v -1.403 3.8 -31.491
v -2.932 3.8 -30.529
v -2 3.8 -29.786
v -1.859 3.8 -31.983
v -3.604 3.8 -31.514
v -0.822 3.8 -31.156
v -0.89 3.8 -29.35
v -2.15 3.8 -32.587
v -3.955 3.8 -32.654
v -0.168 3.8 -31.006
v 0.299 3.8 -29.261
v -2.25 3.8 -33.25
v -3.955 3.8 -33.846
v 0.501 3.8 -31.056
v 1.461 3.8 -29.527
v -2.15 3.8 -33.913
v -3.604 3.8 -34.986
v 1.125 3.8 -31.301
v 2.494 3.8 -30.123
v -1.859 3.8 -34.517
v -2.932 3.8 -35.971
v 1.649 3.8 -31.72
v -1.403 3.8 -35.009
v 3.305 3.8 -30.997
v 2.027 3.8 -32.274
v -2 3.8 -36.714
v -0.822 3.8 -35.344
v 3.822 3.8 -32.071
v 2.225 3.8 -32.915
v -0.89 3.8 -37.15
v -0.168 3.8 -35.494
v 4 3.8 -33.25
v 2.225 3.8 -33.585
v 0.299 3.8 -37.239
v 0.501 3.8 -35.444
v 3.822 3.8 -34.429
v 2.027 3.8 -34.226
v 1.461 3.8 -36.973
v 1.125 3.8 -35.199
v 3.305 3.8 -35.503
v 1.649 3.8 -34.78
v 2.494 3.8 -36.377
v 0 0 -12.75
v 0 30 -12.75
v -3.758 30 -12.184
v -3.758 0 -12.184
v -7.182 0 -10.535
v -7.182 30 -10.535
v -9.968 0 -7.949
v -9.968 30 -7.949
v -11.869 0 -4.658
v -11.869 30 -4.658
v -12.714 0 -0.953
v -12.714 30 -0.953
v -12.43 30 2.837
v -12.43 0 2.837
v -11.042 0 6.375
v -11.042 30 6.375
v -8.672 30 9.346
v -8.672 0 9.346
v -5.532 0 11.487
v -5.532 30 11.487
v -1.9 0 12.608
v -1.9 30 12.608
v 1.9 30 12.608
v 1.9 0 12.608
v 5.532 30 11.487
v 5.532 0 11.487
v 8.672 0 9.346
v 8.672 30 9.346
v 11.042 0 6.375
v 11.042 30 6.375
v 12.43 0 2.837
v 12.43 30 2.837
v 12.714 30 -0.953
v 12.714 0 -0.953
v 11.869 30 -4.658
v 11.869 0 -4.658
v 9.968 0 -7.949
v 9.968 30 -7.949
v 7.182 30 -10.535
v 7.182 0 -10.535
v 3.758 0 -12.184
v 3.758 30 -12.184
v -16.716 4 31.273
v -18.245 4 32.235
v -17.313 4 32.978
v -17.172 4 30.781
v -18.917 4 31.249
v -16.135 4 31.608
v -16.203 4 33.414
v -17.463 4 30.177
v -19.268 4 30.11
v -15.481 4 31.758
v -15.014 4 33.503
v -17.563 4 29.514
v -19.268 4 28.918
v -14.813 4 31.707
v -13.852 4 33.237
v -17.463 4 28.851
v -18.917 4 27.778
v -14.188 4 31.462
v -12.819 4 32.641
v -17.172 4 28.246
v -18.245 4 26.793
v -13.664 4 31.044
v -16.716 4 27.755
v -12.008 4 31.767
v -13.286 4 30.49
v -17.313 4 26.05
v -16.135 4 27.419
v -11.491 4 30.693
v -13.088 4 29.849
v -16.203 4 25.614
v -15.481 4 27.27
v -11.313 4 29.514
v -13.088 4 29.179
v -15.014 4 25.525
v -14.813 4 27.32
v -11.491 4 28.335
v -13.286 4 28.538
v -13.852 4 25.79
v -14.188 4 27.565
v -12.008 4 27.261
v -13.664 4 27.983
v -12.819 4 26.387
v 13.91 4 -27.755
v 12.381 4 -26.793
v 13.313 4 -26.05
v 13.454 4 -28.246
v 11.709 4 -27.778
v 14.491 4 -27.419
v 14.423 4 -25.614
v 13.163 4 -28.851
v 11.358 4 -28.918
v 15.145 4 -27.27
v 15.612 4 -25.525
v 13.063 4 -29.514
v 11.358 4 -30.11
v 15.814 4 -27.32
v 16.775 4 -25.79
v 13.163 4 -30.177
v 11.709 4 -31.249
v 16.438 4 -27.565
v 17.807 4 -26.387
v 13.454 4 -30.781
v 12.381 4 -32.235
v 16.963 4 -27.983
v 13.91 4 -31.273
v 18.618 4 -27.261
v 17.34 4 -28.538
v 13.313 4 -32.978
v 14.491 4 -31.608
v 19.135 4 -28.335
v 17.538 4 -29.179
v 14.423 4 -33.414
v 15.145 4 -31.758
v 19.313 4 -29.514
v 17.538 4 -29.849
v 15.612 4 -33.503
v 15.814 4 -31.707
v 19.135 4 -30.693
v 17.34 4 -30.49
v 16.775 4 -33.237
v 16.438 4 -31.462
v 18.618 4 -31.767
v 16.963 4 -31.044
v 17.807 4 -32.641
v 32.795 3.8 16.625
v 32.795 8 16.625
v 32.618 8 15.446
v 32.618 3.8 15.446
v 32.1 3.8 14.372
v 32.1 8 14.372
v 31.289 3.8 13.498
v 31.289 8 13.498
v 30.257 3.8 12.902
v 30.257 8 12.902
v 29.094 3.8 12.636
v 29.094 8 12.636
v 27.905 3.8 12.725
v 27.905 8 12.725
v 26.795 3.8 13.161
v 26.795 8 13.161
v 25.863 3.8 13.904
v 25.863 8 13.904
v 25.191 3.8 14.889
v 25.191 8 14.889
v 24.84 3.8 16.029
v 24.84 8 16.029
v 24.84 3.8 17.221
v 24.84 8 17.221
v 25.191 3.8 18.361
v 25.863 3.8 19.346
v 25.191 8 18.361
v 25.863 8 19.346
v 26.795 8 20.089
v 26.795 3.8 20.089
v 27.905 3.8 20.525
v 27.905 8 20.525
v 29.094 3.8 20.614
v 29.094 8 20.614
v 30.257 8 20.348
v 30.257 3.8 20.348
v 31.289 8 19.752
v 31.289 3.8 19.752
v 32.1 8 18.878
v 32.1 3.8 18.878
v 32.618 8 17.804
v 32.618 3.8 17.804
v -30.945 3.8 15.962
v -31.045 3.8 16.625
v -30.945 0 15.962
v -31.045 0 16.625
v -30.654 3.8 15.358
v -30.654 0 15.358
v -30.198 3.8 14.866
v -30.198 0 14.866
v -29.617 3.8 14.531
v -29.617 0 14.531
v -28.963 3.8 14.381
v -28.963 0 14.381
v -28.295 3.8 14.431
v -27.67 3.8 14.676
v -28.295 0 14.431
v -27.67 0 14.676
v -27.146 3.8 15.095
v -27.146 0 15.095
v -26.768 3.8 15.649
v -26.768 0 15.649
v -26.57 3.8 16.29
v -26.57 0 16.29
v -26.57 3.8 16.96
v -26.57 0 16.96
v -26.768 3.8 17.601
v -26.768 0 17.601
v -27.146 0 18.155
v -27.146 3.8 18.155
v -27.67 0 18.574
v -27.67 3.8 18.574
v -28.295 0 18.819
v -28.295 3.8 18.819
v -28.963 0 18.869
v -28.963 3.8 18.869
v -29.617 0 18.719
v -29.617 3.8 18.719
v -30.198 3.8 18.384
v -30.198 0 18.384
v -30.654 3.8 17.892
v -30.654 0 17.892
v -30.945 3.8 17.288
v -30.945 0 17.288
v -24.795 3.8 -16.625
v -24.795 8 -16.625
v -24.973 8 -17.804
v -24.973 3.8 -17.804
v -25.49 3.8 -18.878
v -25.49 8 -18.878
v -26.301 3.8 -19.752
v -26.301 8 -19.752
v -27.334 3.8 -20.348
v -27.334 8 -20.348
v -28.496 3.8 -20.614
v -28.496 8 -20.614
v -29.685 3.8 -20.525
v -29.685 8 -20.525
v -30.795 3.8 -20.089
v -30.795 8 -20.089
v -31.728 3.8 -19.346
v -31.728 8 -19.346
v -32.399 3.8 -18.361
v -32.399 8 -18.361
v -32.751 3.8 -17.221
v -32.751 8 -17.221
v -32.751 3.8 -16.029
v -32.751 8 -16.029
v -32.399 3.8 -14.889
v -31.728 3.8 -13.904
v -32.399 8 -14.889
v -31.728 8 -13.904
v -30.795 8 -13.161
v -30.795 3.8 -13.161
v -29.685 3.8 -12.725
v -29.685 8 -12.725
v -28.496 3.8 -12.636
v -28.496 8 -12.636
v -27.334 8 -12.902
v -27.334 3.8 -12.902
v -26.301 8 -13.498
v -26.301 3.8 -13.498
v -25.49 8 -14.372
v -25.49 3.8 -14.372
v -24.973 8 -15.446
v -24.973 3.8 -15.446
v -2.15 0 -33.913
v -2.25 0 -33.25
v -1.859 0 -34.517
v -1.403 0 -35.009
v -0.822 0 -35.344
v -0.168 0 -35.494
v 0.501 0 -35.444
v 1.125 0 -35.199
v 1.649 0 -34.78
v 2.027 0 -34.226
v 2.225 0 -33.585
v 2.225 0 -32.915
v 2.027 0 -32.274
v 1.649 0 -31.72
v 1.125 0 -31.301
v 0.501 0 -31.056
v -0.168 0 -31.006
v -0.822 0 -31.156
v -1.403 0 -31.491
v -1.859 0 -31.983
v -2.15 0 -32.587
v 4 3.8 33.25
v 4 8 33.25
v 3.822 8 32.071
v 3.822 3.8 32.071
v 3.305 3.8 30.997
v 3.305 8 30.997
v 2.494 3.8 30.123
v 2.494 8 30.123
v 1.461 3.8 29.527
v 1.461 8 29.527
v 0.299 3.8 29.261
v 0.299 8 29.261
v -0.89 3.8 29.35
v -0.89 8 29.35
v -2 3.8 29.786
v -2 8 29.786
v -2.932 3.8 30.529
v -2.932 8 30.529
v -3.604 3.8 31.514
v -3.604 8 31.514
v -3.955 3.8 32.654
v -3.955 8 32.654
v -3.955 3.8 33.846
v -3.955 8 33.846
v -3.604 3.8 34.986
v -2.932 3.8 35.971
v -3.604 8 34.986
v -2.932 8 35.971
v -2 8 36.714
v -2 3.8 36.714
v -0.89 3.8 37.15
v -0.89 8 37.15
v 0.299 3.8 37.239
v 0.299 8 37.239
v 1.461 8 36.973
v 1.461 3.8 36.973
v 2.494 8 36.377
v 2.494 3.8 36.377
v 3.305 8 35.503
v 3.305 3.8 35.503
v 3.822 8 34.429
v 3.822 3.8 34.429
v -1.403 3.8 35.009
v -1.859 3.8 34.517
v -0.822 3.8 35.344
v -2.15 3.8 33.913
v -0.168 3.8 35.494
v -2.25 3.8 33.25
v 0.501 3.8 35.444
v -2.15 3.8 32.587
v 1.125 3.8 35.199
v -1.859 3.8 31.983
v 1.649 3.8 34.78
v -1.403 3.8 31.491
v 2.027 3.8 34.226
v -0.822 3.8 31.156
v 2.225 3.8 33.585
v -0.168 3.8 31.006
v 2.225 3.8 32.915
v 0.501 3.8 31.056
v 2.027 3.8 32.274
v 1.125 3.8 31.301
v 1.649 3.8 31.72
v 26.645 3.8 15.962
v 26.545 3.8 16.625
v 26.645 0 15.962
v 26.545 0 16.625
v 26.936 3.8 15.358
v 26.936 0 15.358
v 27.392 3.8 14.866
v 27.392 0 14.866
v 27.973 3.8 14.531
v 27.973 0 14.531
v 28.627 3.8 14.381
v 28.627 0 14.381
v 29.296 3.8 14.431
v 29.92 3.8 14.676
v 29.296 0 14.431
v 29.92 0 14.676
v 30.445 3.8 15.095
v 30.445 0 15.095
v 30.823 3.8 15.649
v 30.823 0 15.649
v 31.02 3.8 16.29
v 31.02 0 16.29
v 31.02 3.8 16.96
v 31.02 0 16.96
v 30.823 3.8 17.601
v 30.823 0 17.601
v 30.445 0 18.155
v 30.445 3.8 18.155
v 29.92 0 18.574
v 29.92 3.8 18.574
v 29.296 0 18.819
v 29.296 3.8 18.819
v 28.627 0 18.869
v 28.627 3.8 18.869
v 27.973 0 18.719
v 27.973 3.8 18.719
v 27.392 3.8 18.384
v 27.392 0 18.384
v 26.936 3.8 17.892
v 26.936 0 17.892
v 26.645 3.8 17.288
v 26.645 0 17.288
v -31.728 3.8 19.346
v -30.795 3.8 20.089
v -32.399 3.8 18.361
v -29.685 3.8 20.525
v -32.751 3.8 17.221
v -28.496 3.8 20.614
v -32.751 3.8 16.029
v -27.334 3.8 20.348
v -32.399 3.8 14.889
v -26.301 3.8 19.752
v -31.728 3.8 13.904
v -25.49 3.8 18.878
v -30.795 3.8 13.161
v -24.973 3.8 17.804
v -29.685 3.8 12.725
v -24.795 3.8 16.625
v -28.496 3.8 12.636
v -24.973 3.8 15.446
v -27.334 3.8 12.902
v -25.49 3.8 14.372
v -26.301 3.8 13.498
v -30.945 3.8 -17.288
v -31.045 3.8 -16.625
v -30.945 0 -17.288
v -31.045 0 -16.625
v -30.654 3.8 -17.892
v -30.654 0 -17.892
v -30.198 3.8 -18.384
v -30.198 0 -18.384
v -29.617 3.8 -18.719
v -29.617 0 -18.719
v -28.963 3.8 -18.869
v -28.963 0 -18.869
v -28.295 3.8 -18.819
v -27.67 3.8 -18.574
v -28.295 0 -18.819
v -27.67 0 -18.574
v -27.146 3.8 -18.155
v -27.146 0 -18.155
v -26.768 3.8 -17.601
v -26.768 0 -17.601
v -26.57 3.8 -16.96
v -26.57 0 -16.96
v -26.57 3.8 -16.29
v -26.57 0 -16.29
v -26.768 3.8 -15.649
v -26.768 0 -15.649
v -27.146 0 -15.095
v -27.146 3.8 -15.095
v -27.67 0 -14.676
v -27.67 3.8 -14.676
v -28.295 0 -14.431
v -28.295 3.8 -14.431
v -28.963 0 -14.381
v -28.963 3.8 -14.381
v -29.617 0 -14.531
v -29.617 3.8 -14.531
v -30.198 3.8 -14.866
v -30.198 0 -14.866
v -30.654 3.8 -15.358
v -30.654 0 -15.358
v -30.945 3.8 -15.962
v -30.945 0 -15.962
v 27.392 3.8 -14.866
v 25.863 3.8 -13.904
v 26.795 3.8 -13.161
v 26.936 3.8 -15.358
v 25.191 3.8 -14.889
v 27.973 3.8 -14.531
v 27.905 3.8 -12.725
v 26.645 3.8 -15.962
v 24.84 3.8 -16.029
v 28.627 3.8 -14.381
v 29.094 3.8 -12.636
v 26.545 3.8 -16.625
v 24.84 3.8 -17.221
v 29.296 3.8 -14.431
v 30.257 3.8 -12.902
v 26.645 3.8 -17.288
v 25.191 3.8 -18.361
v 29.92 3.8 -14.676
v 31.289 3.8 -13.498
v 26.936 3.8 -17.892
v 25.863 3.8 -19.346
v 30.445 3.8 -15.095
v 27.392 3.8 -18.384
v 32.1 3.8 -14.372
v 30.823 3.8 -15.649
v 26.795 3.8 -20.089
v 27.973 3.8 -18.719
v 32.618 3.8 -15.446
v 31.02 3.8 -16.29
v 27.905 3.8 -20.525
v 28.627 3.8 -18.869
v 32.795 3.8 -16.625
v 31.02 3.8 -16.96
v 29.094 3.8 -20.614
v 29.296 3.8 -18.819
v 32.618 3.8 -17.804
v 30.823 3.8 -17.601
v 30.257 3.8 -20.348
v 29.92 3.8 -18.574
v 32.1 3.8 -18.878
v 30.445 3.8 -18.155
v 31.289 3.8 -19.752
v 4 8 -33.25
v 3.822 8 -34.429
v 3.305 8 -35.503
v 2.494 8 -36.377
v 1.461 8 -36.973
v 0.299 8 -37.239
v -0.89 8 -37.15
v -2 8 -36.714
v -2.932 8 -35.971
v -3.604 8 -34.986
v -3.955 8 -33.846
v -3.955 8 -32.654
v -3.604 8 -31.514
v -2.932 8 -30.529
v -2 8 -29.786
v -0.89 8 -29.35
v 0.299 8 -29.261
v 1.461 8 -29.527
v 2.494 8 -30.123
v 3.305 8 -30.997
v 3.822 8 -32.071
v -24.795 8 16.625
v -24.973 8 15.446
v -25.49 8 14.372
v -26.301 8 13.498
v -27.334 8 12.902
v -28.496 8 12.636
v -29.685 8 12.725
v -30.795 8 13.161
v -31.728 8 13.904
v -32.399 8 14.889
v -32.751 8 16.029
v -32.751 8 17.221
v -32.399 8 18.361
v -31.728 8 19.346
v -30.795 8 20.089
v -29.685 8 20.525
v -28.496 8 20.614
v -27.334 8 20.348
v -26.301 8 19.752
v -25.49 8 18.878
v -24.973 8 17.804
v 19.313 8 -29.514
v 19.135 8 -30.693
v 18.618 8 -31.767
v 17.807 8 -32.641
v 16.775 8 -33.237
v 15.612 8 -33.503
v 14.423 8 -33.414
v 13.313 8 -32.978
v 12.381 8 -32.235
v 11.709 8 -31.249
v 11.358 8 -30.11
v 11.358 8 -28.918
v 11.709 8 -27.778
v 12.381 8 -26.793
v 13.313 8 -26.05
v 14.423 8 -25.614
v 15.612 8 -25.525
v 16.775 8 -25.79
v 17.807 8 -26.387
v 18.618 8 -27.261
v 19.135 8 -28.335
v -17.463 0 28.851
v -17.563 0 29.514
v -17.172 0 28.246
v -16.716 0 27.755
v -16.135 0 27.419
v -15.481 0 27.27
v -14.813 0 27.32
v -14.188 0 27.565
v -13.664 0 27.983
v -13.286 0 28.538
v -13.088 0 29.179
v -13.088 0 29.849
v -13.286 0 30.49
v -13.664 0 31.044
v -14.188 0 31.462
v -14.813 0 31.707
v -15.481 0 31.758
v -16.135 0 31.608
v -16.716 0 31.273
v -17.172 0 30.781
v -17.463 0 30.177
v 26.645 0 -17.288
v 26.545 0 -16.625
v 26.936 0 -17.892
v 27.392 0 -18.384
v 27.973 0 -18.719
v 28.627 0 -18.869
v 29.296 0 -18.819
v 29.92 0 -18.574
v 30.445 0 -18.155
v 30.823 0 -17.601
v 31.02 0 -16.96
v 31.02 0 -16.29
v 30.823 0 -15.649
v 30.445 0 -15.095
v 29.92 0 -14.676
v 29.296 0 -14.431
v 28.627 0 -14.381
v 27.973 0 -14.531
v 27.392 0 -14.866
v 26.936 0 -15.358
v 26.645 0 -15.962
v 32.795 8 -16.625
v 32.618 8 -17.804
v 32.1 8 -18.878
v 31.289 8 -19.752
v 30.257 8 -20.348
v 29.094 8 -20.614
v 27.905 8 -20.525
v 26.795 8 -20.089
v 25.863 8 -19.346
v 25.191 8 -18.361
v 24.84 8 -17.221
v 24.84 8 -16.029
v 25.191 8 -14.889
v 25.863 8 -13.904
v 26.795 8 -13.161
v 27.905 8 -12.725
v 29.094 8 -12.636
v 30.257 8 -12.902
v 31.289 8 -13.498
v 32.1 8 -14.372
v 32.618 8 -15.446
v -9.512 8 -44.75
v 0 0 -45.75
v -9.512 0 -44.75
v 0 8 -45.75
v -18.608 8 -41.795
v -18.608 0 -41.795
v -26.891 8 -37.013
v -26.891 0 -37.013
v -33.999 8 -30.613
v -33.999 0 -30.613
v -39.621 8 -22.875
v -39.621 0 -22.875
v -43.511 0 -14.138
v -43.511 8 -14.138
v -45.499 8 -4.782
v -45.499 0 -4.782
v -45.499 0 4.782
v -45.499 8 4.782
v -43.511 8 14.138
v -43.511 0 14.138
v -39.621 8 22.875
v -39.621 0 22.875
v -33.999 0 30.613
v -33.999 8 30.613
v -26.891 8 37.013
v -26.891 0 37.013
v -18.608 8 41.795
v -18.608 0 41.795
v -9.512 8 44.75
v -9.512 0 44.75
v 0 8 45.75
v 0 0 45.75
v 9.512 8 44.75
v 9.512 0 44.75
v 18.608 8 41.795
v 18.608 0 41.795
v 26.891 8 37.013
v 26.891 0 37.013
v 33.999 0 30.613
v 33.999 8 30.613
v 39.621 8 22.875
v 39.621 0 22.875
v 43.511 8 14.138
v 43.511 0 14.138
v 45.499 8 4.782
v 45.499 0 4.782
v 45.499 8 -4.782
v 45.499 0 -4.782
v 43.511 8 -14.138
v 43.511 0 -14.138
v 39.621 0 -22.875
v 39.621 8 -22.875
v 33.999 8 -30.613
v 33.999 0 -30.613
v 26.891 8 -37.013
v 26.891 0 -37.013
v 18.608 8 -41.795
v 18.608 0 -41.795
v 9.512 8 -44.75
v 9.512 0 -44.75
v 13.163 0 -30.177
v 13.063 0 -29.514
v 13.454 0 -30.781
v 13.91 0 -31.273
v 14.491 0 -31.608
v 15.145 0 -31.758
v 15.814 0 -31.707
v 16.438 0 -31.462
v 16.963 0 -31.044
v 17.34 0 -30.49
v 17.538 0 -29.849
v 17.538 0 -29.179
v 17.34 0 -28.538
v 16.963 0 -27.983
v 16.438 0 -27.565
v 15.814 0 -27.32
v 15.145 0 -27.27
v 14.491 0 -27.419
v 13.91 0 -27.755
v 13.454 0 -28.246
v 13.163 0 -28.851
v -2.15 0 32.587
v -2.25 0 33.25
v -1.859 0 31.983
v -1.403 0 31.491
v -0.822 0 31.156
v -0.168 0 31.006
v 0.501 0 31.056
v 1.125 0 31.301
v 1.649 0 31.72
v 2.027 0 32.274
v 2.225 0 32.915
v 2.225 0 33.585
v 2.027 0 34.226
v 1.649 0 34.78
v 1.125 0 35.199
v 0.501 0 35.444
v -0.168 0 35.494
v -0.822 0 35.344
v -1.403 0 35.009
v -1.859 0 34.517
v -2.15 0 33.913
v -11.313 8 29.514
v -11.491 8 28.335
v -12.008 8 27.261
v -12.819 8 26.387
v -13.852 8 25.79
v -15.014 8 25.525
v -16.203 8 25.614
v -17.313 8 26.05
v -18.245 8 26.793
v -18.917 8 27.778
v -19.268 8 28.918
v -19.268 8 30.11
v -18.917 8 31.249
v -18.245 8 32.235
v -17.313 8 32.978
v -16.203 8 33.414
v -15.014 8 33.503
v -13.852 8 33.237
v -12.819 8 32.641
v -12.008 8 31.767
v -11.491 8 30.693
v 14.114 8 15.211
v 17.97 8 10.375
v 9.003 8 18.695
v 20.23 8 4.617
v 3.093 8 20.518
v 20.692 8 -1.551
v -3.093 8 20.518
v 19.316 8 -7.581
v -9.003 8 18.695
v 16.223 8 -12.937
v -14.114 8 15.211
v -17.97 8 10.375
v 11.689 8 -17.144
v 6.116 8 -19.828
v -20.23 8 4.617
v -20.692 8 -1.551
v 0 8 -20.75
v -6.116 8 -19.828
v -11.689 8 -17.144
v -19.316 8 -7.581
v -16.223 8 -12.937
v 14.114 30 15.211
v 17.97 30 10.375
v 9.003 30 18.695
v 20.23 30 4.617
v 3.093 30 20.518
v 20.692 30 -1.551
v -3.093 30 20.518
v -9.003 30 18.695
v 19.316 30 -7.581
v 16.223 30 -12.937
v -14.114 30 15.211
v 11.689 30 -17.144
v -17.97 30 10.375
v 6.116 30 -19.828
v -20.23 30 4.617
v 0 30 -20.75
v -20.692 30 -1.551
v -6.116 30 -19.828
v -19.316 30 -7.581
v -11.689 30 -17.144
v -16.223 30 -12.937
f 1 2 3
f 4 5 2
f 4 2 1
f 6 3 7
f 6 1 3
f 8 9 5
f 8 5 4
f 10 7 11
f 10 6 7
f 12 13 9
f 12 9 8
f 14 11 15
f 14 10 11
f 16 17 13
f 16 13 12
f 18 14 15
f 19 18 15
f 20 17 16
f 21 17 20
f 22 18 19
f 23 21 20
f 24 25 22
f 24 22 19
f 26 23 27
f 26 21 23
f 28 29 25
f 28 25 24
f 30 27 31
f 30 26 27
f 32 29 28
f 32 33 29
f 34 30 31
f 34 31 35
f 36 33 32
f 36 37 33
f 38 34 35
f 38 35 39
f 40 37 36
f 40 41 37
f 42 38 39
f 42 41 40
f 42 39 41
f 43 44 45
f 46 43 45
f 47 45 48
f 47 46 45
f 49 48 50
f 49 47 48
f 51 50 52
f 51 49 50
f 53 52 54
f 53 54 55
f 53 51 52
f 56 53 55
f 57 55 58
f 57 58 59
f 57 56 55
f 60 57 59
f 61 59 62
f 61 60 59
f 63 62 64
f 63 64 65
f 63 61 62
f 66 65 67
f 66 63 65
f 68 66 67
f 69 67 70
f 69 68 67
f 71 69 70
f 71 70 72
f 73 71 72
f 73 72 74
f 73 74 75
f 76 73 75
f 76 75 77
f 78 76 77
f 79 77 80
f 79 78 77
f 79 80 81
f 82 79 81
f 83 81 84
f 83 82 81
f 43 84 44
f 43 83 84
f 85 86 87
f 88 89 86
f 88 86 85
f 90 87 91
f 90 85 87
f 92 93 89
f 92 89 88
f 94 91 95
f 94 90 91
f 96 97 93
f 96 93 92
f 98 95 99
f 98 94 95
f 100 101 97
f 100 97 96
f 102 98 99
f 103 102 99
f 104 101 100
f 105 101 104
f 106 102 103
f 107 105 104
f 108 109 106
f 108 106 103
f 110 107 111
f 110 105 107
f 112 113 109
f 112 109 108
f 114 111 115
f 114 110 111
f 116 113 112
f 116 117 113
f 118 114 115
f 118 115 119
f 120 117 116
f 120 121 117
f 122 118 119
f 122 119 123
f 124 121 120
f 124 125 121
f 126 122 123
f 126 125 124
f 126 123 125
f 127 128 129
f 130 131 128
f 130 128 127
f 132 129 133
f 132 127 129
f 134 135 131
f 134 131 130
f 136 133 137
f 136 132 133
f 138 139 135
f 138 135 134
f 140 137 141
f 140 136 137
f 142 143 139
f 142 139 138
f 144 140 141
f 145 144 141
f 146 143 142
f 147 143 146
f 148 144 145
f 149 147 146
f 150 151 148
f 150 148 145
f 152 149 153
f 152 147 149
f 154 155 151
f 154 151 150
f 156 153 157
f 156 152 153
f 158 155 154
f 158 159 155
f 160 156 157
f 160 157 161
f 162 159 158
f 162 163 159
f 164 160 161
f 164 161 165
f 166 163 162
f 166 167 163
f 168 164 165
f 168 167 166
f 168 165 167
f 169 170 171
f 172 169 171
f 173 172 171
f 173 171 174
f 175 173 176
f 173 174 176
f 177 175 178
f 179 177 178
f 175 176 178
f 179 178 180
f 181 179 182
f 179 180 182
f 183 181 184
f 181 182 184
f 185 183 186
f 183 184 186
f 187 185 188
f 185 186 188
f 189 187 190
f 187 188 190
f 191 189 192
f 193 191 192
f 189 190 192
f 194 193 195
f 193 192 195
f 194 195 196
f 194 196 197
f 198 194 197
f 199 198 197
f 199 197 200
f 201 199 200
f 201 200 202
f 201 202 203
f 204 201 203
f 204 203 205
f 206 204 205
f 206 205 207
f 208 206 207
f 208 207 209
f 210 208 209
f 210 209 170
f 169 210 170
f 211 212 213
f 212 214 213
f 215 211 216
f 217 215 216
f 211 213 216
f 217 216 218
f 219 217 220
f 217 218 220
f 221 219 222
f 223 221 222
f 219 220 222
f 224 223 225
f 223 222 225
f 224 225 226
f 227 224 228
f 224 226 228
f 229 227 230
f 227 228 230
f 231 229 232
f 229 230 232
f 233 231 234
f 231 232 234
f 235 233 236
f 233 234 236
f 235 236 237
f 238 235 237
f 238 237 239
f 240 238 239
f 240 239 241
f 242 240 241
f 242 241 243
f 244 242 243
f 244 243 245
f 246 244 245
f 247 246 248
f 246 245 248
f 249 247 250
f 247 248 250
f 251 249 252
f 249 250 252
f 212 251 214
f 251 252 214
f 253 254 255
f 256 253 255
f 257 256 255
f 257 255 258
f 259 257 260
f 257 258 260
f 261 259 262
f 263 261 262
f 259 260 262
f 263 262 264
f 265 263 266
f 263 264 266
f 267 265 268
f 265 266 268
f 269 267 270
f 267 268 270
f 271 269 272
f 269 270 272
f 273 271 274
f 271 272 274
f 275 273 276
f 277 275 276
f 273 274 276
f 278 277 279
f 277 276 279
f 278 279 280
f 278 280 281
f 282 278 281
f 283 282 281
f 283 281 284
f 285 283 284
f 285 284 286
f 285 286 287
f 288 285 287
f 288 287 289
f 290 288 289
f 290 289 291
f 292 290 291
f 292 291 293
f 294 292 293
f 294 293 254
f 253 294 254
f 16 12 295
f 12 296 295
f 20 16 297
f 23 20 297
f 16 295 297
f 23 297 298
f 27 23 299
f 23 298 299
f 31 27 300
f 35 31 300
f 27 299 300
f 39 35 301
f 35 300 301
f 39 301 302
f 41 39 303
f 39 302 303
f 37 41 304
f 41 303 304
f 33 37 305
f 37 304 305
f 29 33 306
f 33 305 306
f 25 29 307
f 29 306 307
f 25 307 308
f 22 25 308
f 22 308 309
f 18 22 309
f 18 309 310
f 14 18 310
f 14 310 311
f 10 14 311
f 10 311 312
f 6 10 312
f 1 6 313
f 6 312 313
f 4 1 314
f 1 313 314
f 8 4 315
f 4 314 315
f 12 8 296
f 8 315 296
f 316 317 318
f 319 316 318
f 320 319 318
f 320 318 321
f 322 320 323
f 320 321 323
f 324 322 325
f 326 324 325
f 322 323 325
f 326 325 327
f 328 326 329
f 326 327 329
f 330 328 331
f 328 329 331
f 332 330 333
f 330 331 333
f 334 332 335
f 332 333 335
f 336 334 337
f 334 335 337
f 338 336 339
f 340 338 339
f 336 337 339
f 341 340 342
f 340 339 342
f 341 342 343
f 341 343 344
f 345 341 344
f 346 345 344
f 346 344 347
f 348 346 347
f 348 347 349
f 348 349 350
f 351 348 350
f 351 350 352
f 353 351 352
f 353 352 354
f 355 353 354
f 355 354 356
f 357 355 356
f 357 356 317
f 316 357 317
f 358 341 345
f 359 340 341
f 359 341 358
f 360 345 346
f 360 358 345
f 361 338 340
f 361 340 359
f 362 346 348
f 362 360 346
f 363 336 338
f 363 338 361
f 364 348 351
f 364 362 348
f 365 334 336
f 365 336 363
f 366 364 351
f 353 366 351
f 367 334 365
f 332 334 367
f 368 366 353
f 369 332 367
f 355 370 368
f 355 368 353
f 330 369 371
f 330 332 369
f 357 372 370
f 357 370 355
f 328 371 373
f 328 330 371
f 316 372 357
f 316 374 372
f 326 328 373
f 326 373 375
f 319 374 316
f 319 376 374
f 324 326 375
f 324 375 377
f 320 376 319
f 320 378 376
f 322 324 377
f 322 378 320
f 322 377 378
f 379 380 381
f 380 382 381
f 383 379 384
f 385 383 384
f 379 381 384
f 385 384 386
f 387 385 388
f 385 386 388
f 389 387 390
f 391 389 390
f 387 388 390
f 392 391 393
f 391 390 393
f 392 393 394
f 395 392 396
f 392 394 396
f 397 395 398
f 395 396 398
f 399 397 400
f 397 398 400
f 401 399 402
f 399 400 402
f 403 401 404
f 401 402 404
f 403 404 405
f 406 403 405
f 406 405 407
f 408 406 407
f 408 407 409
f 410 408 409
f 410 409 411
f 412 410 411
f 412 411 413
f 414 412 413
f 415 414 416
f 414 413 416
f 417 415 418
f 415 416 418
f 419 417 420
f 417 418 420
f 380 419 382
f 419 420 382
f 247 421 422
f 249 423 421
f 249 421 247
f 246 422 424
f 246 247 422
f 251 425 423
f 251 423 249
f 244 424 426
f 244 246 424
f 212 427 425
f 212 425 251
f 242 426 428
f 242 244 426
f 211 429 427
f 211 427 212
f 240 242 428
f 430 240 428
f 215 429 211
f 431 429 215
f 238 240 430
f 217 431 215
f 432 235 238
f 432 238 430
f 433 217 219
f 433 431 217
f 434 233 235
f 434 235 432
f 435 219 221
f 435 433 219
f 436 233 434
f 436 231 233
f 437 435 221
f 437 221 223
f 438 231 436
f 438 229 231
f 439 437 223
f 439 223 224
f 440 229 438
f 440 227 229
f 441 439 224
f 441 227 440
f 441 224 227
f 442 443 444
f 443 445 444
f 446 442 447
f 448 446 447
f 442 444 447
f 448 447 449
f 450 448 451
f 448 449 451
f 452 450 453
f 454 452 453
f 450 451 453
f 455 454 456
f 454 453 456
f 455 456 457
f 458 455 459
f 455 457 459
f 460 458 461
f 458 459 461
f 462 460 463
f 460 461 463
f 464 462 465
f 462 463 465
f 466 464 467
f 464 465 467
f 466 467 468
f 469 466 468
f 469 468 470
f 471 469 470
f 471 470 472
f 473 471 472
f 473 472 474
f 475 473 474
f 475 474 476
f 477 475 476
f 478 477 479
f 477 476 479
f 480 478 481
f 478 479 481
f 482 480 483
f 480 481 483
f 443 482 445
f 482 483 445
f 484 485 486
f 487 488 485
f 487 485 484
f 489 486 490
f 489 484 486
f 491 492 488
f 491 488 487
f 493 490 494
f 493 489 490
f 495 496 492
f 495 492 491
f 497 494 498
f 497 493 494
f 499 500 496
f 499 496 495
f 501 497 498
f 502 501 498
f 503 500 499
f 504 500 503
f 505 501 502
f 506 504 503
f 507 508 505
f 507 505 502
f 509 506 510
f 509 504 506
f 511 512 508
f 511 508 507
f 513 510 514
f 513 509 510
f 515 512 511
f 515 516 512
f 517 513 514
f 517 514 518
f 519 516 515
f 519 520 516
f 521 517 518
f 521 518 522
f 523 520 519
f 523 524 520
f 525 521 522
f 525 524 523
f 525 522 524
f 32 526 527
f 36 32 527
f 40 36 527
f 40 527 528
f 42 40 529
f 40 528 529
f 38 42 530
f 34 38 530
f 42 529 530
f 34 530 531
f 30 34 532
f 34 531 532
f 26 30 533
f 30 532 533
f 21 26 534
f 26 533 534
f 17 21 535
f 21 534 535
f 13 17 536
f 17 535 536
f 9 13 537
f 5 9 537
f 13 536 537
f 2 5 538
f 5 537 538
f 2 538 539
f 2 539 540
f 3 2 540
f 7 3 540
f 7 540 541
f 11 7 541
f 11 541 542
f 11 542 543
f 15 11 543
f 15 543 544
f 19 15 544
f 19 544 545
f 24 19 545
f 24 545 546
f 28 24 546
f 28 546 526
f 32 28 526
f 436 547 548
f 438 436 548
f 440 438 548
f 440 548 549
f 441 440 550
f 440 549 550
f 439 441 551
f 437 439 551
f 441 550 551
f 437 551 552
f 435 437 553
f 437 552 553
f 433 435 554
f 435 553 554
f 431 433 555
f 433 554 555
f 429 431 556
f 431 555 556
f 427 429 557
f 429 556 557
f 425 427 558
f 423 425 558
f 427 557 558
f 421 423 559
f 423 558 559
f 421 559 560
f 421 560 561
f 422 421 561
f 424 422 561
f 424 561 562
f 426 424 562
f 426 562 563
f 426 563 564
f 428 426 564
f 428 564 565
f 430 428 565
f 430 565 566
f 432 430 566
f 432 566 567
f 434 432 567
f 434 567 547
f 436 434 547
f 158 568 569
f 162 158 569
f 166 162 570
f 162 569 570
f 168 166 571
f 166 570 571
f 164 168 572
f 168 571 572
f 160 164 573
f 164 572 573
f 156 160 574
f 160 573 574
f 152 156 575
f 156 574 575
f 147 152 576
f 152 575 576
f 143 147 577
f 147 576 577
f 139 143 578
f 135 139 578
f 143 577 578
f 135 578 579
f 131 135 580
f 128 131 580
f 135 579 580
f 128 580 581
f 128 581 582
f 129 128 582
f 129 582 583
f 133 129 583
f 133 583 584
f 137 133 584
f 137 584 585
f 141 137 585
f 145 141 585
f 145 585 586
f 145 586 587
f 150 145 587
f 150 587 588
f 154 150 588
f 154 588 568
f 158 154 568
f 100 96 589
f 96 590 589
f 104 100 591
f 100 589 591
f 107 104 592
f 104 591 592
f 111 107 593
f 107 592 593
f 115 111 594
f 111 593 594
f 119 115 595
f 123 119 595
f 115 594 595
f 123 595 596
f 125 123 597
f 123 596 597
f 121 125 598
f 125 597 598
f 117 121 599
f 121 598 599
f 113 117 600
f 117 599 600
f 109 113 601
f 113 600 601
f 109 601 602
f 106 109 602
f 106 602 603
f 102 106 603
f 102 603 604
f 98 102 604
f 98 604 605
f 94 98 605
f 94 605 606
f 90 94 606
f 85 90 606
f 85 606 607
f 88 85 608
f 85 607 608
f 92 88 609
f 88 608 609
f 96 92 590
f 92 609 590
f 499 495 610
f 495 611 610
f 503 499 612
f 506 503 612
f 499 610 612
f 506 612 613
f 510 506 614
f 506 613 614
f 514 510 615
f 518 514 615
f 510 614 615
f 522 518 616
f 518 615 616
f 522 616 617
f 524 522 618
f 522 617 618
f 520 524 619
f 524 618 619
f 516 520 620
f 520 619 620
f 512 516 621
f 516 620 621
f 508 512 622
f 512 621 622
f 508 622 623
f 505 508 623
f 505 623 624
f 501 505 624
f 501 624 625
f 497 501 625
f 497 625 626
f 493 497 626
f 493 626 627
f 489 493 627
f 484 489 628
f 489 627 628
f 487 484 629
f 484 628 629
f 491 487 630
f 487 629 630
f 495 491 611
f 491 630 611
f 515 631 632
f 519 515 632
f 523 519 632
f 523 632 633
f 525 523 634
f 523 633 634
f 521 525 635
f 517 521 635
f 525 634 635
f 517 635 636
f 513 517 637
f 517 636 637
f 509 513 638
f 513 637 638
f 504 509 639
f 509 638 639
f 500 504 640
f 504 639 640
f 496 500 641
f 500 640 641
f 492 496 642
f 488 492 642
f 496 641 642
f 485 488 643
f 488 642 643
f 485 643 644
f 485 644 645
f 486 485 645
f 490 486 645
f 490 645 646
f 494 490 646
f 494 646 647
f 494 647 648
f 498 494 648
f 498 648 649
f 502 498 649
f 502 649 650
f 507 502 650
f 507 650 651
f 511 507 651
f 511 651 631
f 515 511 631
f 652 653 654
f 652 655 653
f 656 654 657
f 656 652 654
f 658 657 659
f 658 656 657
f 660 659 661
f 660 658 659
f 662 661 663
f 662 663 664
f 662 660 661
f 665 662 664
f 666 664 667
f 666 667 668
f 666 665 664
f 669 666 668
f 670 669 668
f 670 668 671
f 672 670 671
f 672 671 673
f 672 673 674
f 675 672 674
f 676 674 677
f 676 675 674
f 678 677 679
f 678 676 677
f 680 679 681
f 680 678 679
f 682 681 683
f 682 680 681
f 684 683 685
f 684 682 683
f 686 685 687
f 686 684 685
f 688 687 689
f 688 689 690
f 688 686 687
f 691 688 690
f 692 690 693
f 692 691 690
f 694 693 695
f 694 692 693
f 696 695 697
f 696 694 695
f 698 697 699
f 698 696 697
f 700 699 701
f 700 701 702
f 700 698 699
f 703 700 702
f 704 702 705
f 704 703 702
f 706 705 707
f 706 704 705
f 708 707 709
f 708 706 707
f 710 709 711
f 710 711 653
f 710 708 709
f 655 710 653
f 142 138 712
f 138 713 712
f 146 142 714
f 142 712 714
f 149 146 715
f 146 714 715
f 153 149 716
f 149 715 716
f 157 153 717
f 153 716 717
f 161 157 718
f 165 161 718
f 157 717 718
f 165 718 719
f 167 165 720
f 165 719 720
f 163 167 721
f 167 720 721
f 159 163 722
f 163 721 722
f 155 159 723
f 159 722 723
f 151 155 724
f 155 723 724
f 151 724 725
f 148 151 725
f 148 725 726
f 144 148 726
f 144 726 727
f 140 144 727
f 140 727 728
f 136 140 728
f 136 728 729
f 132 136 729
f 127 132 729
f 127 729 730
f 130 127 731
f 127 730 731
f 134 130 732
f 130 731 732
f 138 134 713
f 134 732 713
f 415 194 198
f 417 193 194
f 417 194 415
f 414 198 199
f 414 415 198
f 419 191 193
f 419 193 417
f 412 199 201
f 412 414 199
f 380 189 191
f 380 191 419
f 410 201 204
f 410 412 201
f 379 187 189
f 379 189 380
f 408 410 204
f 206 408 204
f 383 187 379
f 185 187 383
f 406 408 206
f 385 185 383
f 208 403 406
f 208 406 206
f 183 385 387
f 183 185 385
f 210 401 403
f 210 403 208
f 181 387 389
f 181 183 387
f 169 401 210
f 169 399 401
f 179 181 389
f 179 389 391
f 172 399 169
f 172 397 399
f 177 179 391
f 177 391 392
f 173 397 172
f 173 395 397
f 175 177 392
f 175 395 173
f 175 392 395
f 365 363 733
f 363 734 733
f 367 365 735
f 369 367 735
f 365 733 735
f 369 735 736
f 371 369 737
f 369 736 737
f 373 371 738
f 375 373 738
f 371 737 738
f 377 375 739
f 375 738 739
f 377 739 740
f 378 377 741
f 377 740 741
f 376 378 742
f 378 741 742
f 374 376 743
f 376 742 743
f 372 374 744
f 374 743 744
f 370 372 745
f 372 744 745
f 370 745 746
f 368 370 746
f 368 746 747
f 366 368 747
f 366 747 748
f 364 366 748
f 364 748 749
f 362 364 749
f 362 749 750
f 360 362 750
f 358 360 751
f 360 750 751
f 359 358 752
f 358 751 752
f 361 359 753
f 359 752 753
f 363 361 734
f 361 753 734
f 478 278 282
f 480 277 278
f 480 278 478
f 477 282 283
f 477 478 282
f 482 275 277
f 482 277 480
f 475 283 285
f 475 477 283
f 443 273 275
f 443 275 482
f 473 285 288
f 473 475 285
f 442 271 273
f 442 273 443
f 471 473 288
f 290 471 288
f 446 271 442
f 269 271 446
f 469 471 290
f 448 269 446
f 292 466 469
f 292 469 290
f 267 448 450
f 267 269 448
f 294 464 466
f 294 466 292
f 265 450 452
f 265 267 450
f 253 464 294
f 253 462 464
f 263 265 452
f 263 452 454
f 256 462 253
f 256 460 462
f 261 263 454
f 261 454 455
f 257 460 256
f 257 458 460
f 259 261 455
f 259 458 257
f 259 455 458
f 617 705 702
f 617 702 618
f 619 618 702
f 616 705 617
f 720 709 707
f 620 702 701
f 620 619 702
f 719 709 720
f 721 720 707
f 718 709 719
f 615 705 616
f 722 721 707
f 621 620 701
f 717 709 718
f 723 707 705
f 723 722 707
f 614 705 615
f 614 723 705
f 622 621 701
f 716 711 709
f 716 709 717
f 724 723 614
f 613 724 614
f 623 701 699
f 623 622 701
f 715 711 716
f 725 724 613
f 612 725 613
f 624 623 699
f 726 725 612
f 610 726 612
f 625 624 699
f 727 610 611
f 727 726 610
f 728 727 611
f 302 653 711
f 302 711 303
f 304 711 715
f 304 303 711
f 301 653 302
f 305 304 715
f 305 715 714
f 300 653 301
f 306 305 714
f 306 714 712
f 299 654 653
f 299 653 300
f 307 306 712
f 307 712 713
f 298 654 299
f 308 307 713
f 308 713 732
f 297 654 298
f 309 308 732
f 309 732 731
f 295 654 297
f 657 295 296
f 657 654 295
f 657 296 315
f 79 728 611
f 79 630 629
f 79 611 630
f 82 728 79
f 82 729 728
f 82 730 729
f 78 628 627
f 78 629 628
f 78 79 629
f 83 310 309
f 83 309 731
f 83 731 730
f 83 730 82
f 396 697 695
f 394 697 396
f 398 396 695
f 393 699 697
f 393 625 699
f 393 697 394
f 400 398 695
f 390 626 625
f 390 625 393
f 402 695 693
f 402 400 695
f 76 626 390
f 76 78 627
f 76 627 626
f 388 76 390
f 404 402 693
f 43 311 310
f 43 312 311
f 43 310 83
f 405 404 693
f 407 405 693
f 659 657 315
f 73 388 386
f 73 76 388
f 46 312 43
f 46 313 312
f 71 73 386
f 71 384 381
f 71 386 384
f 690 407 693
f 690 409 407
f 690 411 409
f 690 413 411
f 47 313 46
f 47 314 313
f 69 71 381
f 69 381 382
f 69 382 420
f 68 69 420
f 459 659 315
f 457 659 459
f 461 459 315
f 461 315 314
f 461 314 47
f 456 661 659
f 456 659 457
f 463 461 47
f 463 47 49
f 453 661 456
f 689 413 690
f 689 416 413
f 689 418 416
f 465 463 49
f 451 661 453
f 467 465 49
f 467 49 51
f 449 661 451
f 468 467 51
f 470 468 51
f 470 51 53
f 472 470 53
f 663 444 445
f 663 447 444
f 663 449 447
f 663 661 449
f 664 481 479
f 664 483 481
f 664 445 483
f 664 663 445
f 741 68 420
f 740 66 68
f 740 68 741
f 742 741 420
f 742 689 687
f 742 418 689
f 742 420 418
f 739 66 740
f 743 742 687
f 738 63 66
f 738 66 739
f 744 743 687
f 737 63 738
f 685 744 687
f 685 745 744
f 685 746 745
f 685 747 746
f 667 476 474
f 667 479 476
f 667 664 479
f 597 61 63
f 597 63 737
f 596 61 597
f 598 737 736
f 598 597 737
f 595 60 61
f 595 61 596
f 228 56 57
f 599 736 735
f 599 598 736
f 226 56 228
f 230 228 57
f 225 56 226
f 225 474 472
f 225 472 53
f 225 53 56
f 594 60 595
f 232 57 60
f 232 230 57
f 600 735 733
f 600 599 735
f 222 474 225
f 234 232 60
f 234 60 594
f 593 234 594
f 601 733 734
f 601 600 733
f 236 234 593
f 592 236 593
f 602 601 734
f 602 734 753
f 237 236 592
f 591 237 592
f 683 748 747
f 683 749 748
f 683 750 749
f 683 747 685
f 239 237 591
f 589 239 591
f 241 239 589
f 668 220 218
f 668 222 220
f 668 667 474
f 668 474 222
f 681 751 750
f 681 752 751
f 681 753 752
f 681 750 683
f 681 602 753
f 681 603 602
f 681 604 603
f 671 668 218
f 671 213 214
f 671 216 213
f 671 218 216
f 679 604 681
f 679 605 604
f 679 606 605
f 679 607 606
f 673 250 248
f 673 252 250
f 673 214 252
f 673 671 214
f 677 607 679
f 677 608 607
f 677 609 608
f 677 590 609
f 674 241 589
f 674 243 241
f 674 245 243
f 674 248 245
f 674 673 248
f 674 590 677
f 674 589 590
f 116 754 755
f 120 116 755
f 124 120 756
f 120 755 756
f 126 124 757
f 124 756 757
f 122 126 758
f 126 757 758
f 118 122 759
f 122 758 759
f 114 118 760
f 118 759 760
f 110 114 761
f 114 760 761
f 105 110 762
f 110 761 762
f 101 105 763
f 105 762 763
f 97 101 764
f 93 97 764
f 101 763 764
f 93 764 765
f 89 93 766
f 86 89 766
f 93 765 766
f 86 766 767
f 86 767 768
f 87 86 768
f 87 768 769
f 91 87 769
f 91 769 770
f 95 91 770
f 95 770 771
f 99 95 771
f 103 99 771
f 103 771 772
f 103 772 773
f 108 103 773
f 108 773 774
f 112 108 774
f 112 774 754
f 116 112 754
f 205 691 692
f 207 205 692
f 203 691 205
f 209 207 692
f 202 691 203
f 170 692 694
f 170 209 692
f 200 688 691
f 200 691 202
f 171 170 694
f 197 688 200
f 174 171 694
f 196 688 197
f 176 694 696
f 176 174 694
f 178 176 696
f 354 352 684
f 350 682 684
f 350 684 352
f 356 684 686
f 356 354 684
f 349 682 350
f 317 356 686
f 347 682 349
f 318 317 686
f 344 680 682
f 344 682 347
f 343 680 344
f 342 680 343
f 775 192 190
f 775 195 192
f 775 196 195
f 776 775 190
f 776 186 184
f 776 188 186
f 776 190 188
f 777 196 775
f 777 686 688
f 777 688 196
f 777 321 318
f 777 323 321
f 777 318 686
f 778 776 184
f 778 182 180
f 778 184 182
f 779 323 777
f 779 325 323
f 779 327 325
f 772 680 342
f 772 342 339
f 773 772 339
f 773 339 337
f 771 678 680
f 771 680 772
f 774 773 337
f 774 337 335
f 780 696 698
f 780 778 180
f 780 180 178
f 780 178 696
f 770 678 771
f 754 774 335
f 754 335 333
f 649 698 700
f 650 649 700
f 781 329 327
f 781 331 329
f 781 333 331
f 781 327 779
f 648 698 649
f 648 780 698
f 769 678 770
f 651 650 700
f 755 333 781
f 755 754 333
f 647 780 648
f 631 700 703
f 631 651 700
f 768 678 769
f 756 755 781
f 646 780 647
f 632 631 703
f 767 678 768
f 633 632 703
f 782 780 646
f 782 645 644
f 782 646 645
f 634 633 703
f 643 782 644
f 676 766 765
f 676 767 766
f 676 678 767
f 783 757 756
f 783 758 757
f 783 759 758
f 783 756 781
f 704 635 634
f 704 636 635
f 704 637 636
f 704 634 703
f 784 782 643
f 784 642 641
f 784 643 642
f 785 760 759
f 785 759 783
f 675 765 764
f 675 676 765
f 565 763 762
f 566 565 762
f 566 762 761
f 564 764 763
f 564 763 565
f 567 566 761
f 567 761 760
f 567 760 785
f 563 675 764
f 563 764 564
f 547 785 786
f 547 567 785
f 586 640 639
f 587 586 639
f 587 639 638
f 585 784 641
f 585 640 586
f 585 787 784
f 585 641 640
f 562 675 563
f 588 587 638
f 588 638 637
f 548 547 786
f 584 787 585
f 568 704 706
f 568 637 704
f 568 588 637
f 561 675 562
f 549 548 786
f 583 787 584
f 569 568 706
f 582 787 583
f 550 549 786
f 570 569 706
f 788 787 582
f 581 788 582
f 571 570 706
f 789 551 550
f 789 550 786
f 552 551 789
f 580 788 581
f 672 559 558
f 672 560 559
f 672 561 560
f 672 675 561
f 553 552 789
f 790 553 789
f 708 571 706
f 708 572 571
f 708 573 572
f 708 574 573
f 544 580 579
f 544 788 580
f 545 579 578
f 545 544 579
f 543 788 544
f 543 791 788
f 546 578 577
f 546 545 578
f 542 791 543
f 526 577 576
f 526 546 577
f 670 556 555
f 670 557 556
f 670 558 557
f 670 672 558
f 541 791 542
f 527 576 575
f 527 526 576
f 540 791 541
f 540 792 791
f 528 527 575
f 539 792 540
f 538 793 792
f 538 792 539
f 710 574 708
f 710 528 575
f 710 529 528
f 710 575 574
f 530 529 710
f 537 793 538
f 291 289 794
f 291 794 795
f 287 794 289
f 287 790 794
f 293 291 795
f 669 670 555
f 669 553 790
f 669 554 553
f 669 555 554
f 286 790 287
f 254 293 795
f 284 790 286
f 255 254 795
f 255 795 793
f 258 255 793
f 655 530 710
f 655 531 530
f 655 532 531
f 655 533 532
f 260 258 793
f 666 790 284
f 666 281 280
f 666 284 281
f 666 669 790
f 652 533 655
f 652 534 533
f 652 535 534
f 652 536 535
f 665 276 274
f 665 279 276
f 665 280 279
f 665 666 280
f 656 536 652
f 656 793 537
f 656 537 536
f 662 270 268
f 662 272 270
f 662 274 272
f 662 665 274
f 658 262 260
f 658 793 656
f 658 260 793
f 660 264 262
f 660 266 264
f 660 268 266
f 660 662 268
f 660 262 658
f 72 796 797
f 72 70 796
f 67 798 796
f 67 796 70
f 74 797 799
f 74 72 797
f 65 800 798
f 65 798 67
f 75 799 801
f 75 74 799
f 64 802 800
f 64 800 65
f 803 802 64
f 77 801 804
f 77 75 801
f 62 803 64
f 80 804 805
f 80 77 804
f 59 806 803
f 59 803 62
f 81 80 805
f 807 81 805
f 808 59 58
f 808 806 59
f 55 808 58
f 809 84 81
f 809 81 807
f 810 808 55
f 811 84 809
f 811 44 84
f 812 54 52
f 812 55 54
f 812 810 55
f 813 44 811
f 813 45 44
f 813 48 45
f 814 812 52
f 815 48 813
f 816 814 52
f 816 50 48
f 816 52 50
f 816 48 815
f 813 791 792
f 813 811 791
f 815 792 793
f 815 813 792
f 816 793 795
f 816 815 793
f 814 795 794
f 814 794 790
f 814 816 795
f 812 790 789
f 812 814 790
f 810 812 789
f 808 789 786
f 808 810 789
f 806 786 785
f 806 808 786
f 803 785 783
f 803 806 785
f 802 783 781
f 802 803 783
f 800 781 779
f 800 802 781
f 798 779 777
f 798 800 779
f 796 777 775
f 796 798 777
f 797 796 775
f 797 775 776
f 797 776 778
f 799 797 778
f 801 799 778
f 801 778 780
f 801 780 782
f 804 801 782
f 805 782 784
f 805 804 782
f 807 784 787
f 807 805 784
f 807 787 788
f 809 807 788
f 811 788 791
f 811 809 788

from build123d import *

# Parameters (mm, degrees)
CBORE_FOR_M4_SHCS3_D           = 4.5
CBORE_FOR_M4_SHCS3_CBORE_D     = 8
CBORE_FOR_M4_SHCS3_CBORE_DEPTH = 4.2
CBORE_FOR_M4_SHCS4_D           = 4.5
CBORE_FOR_M4_SHCS4_CBORE_D     = 8
CBORE_FOR_M4_SHCS4_CBORE_DEPTH = 4


with BuildPart() as part:
    # Sketch1 → Revolve1 (revolve)
    with BuildSketch(Plane(origin=(0, 0, 0), x_dir=(0, 0, -1), z_dir=(1, 0, 0)), mode=Mode.PRIVATE) as revolve1_sk:
        Polygon((-12.75, 0), (-45.75, 0), (-45.75, 8), (-20.75, 8), (-20.75, 30), (-12.75, 30), align=None)
    revolve(revolve1_sk.sketch.rotate(Axis((0, -55, 0), (0, 1, 0)), 180), axis=Axis((0, -55, 0), (0, 1, 0)))

    # CBORE for M4 SHCS3 (through all)
    with Locations(Plane(origin=(0, 8, 0), x_dir=(1, 0, 0), z_dir=(0, 1, 0))):
        with Locations((0, 33.25), (28.795344676, 16.625), (28.795344676, -16.625), (0, -33.25), (-28.795344676, -16.625), (-28.795344676, 16.625)):
            CounterBoreHole(CBORE_FOR_M4_SHCS3_D / 2, CBORE_FOR_M4_SHCS3_CBORE_D / 2, CBORE_FOR_M4_SHCS3_CBORE_DEPTH)

    # CBORE for M4 SHCS4 (through all)
    with Locations(Plane(origin=(0, 8, 0), x_dir=(1, 0, 0), z_dir=(0, 1, 0))):
        with Locations((15.313173529, 29.513881759), (-15.313173529, -29.513881759)):
            CounterBoreHole(CBORE_FOR_M4_SHCS4_D / 2, CBORE_FOR_M4_SHCS4_CBORE_D / 2, CBORE_FOR_M4_SHCS4_CBORE_DEPTH)


solid = part.part
